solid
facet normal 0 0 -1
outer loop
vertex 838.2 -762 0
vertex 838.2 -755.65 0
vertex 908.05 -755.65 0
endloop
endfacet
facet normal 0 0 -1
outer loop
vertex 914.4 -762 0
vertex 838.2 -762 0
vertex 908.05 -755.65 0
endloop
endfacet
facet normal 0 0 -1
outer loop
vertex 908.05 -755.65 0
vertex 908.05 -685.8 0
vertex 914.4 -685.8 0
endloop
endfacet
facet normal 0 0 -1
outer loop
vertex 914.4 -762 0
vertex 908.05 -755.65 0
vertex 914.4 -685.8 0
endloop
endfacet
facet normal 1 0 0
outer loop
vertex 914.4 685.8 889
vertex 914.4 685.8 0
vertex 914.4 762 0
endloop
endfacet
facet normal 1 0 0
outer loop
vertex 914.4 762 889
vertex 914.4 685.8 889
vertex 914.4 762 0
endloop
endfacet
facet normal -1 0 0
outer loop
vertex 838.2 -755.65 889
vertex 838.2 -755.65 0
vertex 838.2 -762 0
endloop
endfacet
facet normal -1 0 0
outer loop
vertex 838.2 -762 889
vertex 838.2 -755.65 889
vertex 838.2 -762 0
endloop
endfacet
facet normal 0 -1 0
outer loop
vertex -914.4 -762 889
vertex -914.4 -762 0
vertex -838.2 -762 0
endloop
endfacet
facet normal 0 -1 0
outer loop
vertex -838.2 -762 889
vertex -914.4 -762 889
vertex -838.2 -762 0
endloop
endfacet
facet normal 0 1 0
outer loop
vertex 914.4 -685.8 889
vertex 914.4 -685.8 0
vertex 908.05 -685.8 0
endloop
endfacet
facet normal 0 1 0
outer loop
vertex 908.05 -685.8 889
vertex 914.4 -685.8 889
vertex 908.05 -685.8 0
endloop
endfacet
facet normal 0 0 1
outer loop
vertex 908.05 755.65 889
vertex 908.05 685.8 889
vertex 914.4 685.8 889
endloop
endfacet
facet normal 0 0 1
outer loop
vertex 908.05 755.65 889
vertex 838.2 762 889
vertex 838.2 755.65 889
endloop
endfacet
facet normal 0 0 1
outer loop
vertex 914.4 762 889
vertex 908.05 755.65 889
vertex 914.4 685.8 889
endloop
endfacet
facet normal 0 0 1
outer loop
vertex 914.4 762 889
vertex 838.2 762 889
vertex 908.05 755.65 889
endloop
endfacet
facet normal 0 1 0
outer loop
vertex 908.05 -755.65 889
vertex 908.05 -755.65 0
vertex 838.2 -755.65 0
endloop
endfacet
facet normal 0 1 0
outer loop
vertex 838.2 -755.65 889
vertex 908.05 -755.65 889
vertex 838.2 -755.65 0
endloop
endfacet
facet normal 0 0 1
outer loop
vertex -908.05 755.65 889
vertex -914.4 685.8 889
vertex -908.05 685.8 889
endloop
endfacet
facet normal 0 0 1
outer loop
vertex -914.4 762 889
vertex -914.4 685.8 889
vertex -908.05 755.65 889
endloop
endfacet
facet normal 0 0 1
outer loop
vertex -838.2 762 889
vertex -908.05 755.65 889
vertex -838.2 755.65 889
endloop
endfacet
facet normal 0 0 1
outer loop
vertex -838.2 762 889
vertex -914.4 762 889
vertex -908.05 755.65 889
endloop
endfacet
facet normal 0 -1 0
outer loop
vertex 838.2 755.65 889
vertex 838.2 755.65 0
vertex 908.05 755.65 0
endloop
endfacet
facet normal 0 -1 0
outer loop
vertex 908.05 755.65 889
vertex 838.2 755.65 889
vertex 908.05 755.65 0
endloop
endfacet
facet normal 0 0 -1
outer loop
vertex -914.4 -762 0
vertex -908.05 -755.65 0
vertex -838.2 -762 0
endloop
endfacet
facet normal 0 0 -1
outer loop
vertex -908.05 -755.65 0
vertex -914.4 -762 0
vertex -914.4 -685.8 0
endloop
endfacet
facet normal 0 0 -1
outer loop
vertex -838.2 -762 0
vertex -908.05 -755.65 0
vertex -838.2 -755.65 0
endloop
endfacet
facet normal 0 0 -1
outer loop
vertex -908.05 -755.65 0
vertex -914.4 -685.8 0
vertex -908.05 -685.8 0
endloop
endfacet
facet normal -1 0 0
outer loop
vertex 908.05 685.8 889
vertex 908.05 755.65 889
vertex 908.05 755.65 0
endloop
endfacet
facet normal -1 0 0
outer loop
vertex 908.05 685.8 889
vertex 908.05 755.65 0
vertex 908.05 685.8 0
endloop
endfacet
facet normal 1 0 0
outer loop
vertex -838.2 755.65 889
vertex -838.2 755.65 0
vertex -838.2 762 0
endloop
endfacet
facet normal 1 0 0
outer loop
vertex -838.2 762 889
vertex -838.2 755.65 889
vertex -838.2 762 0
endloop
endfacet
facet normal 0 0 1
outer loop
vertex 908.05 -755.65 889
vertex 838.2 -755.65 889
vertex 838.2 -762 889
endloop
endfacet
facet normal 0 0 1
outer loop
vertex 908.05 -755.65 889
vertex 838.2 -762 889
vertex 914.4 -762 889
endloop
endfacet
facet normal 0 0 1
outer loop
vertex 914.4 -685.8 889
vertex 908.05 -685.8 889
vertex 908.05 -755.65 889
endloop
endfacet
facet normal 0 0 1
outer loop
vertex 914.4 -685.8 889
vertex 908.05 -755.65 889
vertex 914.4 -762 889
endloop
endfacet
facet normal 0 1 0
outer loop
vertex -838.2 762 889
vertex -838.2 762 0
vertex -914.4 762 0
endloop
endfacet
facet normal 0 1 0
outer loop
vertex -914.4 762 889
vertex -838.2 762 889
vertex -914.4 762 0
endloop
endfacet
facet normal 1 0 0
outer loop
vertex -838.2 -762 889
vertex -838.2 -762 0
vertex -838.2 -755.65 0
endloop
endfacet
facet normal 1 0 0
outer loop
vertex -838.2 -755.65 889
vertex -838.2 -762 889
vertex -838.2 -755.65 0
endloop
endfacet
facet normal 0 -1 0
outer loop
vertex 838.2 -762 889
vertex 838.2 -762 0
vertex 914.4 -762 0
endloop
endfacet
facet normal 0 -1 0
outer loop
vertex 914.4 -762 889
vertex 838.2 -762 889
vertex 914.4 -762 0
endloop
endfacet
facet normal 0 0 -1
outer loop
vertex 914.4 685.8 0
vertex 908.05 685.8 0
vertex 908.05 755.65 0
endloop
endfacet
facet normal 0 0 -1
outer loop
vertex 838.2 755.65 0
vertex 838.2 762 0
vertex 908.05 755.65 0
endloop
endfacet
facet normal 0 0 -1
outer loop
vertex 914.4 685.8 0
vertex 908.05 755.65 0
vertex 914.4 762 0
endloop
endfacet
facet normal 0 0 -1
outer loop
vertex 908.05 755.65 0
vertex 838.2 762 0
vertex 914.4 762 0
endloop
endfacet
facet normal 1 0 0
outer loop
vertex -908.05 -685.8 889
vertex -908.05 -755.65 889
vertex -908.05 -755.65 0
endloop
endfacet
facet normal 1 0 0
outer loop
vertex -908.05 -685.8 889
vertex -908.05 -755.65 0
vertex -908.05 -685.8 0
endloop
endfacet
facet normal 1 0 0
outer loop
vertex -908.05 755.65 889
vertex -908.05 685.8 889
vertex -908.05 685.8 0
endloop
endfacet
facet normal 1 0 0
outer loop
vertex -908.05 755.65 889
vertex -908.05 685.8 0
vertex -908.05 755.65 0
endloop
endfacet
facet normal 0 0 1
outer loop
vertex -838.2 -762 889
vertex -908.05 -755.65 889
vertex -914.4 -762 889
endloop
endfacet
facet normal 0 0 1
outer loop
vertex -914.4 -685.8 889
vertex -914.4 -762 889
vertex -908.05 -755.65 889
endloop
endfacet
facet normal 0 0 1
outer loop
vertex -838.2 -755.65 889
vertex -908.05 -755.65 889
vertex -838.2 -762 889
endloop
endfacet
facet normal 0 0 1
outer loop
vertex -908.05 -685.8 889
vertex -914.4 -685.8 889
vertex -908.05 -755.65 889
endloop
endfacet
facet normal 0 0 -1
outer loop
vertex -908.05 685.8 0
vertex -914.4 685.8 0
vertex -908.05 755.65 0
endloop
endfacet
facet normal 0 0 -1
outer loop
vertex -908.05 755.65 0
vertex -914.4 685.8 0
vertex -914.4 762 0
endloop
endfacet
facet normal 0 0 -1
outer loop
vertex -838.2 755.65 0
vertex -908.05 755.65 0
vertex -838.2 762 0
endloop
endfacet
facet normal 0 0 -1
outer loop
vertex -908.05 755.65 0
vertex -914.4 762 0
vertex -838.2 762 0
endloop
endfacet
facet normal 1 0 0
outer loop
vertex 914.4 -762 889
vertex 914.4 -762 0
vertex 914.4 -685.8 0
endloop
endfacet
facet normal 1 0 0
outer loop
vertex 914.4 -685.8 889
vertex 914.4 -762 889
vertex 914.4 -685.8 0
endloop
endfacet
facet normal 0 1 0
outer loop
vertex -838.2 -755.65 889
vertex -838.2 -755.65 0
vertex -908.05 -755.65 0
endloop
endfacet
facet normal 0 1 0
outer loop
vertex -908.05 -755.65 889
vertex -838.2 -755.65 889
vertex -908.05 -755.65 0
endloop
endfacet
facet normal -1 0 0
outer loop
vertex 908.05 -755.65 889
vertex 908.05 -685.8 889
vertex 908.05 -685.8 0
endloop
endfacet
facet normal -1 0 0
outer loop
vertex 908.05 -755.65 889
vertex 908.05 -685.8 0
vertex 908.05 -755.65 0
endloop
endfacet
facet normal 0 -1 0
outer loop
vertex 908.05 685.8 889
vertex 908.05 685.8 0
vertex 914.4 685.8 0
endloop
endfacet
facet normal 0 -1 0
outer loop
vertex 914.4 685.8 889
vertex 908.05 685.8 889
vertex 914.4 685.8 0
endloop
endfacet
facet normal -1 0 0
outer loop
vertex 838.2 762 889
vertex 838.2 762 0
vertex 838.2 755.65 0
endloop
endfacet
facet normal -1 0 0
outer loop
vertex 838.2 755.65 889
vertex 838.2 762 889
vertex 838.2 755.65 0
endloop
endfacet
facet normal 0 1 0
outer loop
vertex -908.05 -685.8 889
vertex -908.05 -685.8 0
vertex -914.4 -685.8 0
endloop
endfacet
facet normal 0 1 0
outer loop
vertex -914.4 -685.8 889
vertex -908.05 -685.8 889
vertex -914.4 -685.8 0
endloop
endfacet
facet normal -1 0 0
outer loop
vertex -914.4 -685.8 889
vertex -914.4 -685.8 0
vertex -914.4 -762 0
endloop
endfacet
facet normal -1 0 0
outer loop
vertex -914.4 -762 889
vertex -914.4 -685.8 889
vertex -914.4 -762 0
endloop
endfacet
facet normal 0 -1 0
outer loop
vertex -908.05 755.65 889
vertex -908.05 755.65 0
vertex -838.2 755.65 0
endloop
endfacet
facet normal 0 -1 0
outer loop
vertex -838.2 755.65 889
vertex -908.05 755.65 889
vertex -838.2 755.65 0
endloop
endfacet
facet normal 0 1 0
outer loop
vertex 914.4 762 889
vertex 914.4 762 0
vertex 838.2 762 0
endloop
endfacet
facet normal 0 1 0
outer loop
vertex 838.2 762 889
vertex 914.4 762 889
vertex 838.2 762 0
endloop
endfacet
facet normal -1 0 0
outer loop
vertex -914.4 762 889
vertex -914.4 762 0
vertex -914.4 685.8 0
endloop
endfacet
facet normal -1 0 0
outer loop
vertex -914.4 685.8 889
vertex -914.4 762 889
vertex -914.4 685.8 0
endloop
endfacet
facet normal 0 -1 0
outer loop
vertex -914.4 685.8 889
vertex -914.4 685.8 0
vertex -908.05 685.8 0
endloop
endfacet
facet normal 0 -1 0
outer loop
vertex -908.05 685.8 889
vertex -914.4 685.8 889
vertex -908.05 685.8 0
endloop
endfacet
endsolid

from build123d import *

# Parameters (mm, degrees)
F1_DEPTH = 889


with BuildPart() as f1:
    # F0 (on Top) → F1 (new body)
    with BuildSketch(Plane.XY):
        Polygon((-914.4, -685.8), (-914.4, -762), (-838.2, -762), (-838.2, -755.65), (-908.05, -755.65), (-908.05, -685.8), align=None)
        Polygon((-914.4, 762), (-914.4, 685.8), (-908.05, 685.8), (-908.05, 755.65), (-838.2, 755.65), (-838.2, 762), align=None)
        Polygon((914.4, -762), (914.4, -685.8), (908.05, -685.8), (908.05, -755.65), (838.2, -755.65), (838.2, -762), align=None)
        Polygon((908.05, 685.8), (914.4, 685.8), (914.4, 762), (838.2, 762), (838.2, 755.65), (908.05, 755.65), align=None)
    extrude(amount=F1_DEPTH)


solid = f1.part
